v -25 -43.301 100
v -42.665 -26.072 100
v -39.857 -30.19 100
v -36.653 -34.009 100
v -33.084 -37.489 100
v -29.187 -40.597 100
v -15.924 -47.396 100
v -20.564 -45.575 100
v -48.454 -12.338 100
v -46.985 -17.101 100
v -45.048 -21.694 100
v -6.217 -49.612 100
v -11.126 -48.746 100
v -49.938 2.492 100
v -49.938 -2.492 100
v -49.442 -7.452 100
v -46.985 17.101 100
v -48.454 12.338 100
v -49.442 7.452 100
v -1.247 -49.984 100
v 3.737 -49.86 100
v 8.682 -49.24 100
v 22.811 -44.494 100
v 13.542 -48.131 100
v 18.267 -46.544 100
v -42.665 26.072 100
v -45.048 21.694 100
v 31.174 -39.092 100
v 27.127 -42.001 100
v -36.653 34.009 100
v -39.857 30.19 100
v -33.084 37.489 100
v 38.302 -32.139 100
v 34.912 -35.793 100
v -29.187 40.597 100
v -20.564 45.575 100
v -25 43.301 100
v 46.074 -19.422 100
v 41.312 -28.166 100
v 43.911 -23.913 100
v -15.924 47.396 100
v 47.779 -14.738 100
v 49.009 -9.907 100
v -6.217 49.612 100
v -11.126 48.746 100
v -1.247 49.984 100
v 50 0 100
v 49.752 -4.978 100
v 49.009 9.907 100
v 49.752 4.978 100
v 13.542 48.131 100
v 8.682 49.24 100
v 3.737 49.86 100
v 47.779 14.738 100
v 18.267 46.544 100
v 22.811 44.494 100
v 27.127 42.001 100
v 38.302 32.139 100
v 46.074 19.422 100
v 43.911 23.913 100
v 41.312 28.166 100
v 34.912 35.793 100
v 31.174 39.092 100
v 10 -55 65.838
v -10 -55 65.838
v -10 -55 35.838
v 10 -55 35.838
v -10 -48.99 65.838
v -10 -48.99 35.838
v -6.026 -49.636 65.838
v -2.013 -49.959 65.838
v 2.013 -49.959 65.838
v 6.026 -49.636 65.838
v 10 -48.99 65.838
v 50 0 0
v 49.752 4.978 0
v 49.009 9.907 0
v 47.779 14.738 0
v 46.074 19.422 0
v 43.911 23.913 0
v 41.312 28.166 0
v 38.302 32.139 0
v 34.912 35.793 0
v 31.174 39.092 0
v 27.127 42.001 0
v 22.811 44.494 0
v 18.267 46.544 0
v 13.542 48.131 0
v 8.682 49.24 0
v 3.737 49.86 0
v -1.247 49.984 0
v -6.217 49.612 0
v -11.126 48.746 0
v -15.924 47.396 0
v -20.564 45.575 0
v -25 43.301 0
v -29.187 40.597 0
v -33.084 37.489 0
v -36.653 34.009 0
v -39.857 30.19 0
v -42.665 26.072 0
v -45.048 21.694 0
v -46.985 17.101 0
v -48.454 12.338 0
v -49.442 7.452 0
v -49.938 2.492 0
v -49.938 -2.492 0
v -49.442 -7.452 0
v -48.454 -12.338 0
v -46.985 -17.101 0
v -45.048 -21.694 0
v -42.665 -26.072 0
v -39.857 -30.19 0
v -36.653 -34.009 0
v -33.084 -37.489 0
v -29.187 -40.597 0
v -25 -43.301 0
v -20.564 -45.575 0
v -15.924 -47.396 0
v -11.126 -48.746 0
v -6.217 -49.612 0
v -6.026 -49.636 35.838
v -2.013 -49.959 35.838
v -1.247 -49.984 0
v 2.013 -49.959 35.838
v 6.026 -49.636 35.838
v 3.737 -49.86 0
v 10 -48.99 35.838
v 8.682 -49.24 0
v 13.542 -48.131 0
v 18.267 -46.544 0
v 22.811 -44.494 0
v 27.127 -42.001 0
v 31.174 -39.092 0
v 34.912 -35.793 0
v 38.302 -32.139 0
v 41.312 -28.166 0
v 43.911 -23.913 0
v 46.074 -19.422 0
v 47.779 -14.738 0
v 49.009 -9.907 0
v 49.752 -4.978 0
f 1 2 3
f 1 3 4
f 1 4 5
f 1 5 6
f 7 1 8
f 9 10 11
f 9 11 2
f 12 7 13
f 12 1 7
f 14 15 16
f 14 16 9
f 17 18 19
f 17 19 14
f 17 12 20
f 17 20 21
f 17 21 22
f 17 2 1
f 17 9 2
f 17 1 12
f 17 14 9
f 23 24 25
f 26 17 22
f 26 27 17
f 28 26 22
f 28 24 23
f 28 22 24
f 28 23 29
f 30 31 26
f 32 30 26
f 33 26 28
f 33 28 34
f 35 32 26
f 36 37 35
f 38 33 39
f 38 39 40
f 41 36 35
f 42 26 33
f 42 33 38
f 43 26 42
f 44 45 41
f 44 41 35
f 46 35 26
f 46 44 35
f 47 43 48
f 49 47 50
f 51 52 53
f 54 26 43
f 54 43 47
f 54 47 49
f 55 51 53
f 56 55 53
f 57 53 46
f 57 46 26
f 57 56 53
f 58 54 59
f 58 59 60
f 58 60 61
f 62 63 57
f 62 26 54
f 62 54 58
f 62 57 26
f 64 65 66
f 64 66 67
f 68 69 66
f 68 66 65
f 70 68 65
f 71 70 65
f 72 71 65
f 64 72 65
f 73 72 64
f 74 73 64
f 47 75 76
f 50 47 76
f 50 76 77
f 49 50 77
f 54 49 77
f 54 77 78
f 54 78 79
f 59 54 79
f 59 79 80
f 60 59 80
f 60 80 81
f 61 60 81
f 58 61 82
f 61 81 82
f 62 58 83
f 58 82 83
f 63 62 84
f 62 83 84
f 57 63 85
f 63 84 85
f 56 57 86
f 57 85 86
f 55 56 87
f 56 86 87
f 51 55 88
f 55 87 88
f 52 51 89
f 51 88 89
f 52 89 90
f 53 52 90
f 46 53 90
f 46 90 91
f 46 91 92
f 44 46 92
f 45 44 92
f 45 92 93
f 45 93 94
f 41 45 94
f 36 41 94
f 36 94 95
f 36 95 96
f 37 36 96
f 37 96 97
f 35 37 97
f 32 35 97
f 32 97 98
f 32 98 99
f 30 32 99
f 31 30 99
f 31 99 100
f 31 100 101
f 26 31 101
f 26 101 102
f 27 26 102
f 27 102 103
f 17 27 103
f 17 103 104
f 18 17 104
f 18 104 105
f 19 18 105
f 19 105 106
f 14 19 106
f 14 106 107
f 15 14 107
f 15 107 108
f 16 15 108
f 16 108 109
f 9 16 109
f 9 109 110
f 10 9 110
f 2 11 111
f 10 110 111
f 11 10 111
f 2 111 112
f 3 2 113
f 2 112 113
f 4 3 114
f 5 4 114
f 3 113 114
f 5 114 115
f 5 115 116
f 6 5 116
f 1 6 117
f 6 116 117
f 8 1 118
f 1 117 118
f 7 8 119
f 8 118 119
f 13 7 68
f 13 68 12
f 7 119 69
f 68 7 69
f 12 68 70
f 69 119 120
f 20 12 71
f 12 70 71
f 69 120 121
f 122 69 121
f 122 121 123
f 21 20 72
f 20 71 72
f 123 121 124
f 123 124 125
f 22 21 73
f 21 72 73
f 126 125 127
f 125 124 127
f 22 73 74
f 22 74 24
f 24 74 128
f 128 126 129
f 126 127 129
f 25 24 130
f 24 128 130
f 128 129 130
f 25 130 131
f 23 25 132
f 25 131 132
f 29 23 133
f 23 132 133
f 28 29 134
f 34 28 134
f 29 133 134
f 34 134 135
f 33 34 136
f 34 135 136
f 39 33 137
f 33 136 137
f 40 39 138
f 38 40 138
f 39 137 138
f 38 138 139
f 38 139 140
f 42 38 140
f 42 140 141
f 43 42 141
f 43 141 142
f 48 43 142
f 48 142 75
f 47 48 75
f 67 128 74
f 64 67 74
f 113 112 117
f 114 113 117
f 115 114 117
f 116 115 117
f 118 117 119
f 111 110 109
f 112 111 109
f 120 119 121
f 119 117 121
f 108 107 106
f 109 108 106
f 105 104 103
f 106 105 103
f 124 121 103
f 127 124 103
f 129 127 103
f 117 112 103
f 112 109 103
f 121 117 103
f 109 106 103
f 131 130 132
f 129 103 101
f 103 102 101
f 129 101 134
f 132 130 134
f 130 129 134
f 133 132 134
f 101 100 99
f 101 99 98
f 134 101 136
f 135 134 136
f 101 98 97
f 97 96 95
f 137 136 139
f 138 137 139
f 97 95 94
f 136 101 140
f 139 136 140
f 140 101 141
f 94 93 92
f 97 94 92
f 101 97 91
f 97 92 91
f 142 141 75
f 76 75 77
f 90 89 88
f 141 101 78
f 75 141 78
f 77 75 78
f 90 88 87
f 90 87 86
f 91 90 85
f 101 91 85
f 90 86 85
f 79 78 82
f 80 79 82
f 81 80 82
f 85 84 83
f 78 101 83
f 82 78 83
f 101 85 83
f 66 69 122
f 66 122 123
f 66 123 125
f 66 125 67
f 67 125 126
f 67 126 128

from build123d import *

# Parameters (mm, degrees)
F0_R     = 50
F1_DEPTH = 100
F2_W     = 20
F2_H     = 30
F3_DEPTH = 55


with BuildPart() as f1:
    # F0 (on Top) → F1 (new body)
    with BuildSketch(Plane.XY):
        Circle(F0_R)
    extrude(amount=F1_DEPTH)

    # F2 (on Front) → F3 (join)
    with BuildSketch(Plane.XZ):
        with Locations((0, 50.83777)):
            Rectangle(F2_W, F2_H)
    extrude(amount=F3_DEPTH)


solid = f1.part
